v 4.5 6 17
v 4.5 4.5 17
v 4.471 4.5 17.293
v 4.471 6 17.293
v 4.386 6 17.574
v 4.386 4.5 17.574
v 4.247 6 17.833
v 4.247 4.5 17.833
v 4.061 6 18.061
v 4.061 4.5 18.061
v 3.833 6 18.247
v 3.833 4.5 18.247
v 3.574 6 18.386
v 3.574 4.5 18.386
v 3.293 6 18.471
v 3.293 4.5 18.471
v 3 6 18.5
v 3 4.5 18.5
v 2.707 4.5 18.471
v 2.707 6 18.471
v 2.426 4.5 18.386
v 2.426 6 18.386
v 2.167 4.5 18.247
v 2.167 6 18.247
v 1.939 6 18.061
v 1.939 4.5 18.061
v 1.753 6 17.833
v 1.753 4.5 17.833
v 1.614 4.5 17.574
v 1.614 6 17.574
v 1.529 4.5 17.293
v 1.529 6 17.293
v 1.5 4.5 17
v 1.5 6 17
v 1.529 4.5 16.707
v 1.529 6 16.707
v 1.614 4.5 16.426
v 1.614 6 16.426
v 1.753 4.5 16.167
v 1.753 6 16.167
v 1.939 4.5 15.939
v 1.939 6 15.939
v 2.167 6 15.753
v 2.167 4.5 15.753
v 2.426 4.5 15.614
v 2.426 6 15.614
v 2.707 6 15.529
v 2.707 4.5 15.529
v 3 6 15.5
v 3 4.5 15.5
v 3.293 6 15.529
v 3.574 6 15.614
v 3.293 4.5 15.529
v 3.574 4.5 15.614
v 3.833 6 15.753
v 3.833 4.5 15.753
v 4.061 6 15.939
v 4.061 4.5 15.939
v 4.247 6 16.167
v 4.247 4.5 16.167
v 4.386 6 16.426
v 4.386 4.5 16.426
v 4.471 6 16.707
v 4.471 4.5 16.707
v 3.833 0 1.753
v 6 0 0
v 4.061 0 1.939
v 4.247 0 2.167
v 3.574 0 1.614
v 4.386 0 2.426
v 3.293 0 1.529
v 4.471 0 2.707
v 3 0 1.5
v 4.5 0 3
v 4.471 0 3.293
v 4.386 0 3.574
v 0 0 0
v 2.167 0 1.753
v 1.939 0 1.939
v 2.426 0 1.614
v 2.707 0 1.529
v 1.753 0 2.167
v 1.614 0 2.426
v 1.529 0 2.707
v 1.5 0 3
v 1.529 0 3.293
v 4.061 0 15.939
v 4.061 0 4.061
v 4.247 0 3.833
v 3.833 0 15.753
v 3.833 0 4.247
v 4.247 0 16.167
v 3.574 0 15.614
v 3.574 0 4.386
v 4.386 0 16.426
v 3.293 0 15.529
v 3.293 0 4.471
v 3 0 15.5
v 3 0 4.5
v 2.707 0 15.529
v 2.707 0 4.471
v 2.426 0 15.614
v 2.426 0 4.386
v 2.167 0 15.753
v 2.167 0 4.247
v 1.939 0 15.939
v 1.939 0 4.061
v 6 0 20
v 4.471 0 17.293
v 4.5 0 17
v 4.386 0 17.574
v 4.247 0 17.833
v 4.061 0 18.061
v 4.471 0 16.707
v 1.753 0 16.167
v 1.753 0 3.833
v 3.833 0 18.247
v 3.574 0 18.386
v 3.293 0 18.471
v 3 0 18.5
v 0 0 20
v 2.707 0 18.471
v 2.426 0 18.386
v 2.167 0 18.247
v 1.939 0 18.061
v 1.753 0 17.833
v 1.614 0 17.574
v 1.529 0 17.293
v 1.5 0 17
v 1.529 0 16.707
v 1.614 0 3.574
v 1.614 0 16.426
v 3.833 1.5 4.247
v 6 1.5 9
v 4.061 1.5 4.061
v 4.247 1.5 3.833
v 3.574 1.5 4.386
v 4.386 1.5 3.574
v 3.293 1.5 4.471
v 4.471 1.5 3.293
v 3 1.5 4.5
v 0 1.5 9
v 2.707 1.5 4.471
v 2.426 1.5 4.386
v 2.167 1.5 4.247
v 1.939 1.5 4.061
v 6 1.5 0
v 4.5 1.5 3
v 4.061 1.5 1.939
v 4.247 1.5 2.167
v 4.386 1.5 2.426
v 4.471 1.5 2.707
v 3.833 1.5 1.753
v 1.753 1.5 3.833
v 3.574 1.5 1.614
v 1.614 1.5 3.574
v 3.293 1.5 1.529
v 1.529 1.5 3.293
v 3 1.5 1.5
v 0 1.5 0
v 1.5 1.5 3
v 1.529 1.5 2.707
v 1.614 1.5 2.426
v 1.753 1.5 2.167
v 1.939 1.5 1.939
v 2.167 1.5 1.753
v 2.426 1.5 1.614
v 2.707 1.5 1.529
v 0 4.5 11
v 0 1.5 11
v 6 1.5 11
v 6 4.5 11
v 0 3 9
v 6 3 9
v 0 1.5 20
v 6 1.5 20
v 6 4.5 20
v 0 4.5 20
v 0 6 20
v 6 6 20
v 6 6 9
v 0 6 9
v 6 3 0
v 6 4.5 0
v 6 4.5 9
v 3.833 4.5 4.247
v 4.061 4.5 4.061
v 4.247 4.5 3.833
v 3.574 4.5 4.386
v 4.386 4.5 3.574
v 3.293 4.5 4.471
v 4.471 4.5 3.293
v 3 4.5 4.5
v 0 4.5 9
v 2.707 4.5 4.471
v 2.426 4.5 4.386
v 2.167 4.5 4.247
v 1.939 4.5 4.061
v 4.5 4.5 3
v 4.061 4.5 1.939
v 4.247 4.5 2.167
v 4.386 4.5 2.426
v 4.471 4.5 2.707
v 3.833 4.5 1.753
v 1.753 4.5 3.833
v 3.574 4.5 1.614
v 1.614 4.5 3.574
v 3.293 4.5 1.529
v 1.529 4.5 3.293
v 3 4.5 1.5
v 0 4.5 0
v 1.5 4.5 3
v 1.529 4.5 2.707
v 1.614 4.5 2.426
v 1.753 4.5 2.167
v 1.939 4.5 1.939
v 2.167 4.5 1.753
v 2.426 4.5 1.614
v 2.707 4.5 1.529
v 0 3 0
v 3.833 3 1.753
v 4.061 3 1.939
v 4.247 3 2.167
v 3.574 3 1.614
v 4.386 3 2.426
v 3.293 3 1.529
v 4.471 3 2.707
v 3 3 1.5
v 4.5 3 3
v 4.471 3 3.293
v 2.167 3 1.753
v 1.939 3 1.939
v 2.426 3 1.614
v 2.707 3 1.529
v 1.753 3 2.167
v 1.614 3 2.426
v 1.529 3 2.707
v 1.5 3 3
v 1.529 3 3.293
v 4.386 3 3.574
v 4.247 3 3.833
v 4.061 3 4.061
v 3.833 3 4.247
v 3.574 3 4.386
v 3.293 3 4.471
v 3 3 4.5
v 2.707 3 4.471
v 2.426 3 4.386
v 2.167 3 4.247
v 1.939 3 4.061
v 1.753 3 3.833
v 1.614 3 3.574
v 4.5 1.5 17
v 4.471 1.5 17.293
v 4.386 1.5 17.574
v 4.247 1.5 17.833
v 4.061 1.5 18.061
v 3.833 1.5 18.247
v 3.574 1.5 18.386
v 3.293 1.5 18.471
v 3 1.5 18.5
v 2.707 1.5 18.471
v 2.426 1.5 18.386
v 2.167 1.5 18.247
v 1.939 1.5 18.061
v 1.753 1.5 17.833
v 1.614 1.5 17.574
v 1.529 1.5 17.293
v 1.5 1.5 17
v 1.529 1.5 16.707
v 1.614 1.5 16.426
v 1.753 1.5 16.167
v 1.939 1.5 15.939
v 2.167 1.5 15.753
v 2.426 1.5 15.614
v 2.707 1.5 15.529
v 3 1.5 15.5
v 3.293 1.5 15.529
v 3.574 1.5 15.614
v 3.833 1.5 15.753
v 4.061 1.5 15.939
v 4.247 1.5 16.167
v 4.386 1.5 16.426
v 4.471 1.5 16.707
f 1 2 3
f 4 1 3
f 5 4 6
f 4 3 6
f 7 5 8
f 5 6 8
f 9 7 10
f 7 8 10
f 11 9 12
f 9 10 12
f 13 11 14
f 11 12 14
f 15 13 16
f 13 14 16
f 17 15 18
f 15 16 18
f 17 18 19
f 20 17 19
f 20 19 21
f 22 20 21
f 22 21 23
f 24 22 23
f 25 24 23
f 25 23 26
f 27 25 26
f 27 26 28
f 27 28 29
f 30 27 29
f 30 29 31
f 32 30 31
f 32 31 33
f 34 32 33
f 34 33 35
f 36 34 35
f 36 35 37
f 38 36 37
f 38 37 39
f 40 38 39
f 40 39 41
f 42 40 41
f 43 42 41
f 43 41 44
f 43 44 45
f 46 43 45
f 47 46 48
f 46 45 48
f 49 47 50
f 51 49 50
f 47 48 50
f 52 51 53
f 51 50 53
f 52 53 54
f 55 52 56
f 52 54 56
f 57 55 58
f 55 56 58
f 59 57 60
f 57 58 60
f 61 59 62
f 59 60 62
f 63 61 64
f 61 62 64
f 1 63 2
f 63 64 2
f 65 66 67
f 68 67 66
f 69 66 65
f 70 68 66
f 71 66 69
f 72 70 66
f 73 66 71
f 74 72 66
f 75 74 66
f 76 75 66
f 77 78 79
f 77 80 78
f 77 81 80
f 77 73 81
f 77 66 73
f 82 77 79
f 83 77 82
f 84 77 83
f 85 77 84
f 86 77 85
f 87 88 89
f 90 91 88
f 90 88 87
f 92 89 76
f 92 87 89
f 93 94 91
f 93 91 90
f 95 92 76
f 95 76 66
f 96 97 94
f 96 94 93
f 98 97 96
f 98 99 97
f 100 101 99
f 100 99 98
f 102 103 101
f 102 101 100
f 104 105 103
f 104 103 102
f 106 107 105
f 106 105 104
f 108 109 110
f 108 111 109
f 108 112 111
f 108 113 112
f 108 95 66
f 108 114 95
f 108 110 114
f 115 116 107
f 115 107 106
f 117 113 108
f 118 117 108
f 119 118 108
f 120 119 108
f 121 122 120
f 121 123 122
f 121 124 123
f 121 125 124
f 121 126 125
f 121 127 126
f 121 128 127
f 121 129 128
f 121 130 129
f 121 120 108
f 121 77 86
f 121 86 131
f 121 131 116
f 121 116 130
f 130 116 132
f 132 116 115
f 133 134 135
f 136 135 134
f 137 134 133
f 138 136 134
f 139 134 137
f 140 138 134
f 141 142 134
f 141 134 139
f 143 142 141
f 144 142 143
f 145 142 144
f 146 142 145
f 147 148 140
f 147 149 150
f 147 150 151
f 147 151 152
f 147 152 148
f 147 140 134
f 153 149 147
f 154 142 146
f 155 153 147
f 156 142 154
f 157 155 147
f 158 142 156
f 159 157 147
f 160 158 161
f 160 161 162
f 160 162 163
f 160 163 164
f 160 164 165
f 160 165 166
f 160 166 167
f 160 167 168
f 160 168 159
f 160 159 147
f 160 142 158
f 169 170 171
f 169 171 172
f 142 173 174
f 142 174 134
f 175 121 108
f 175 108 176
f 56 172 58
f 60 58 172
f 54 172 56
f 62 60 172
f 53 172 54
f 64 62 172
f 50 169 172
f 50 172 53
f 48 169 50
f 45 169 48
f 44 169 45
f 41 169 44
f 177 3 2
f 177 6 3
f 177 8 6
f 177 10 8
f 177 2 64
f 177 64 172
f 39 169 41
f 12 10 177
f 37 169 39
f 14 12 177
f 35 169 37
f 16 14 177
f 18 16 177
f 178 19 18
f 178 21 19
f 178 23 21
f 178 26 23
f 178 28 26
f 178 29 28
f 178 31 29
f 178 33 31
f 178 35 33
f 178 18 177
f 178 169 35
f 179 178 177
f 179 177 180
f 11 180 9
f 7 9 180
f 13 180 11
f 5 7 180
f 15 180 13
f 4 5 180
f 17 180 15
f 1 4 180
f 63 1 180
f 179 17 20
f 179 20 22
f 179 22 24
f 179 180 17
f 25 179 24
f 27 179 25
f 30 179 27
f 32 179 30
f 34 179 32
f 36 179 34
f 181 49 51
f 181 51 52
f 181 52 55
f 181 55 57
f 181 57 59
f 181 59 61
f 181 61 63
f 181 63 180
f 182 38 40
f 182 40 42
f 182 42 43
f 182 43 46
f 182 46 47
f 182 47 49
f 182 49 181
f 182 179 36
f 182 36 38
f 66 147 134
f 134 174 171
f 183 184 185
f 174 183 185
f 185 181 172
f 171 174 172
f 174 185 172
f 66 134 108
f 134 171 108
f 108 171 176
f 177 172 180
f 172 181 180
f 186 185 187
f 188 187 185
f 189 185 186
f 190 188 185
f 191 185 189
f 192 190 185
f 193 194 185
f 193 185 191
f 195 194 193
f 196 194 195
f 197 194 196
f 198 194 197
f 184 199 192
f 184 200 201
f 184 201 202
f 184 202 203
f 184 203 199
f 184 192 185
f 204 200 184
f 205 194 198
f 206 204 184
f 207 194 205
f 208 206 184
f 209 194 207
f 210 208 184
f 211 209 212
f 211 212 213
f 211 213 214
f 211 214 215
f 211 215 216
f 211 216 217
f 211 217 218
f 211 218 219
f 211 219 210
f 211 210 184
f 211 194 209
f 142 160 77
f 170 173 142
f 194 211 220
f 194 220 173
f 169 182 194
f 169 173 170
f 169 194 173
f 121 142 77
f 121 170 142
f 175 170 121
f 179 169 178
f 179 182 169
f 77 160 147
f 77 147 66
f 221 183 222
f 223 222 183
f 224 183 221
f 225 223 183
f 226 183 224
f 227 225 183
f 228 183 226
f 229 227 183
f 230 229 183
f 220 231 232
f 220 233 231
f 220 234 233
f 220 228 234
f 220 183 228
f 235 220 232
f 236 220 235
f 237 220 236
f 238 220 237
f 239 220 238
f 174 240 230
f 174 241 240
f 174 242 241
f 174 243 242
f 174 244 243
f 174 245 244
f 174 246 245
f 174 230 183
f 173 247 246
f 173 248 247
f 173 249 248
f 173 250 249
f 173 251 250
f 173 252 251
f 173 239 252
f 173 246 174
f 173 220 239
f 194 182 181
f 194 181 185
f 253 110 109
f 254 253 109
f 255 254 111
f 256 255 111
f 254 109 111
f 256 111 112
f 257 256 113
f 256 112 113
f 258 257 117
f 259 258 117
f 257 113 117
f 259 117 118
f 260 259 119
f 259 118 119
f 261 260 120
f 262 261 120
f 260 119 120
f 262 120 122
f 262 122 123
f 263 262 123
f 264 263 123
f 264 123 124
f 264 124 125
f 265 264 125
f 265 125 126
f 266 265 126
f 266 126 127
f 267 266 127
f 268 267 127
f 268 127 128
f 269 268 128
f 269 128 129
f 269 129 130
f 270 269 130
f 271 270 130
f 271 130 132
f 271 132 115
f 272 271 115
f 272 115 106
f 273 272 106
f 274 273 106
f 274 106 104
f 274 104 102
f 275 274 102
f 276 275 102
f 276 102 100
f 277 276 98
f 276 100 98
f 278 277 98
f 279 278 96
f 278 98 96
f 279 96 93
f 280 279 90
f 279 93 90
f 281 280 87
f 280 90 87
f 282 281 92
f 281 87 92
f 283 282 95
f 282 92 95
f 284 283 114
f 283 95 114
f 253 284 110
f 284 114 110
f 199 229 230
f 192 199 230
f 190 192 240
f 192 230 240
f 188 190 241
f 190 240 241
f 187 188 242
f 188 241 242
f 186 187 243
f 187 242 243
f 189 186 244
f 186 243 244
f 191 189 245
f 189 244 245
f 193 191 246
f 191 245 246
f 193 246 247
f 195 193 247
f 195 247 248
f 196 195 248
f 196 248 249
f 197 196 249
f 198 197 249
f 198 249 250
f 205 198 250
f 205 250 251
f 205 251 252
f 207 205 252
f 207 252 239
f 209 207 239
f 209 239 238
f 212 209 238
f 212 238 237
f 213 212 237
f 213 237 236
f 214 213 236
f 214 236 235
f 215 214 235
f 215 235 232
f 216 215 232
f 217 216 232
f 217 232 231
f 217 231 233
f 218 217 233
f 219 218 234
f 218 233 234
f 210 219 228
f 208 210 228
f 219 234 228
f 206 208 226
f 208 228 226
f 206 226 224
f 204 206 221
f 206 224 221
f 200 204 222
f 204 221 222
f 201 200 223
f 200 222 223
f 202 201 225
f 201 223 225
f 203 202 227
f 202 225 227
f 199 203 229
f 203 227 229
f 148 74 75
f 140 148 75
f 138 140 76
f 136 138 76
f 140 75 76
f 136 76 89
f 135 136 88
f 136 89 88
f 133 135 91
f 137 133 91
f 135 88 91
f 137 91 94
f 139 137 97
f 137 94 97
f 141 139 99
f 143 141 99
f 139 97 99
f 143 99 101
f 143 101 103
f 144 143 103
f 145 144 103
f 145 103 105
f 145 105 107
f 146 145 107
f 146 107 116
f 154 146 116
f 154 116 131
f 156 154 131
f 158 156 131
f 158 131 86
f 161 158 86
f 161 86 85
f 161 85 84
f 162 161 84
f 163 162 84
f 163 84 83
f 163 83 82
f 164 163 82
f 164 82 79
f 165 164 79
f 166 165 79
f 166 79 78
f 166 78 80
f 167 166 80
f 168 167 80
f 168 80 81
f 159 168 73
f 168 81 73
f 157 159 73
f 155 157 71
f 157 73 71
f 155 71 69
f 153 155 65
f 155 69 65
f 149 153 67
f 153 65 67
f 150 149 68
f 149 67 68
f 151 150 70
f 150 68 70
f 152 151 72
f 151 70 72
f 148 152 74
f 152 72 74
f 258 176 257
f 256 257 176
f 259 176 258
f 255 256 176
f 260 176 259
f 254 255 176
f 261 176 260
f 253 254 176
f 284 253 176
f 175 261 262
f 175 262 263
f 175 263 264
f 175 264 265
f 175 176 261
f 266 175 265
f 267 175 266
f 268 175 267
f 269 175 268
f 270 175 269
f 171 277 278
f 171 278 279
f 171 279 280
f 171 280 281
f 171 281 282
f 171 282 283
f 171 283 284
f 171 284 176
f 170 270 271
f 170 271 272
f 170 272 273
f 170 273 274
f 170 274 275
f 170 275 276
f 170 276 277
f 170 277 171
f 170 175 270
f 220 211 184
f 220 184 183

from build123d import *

# Parameters (mm, degrees)
BOSS_EXTRUDE1_DEPTH = 6
SKETCH2_R           = 1.5
CUT_EXTRUDE1_DEPTH  = 6


with BuildPart() as part:
    # Sketch1 → Boss-Extrude1 (new body)
    with BuildSketch(Plane(origin=(0, 0, 0), x_dir=(0, 0, -1), z_dir=(1, 0, 0))):
        Polygon((0, 0), (-20, 0), (-20, 1.5), (-11, 1.5), (-11, 4.5), (-20, 4.5), (-20, 6), (-9, 6), (-9, 4.5), (0, 4.5), (0, 3), (-9, 3), (-9, 1.5), (0, 1.5), align=None)
    extrude(amount=BOSS_EXTRUDE1_DEPTH)

    # Sketch2 → Cut-Extrude1 (cut)
    with BuildSketch(Plane.XZ):
        with Locations((3, 3)):
            Circle(SKETCH2_R)
        with Locations((3, 17)):
            Circle(SKETCH2_R)
    extrude(amount=-CUT_EXTRUDE1_DEPTH, mode=Mode.SUBTRACT)


solid = part.part
